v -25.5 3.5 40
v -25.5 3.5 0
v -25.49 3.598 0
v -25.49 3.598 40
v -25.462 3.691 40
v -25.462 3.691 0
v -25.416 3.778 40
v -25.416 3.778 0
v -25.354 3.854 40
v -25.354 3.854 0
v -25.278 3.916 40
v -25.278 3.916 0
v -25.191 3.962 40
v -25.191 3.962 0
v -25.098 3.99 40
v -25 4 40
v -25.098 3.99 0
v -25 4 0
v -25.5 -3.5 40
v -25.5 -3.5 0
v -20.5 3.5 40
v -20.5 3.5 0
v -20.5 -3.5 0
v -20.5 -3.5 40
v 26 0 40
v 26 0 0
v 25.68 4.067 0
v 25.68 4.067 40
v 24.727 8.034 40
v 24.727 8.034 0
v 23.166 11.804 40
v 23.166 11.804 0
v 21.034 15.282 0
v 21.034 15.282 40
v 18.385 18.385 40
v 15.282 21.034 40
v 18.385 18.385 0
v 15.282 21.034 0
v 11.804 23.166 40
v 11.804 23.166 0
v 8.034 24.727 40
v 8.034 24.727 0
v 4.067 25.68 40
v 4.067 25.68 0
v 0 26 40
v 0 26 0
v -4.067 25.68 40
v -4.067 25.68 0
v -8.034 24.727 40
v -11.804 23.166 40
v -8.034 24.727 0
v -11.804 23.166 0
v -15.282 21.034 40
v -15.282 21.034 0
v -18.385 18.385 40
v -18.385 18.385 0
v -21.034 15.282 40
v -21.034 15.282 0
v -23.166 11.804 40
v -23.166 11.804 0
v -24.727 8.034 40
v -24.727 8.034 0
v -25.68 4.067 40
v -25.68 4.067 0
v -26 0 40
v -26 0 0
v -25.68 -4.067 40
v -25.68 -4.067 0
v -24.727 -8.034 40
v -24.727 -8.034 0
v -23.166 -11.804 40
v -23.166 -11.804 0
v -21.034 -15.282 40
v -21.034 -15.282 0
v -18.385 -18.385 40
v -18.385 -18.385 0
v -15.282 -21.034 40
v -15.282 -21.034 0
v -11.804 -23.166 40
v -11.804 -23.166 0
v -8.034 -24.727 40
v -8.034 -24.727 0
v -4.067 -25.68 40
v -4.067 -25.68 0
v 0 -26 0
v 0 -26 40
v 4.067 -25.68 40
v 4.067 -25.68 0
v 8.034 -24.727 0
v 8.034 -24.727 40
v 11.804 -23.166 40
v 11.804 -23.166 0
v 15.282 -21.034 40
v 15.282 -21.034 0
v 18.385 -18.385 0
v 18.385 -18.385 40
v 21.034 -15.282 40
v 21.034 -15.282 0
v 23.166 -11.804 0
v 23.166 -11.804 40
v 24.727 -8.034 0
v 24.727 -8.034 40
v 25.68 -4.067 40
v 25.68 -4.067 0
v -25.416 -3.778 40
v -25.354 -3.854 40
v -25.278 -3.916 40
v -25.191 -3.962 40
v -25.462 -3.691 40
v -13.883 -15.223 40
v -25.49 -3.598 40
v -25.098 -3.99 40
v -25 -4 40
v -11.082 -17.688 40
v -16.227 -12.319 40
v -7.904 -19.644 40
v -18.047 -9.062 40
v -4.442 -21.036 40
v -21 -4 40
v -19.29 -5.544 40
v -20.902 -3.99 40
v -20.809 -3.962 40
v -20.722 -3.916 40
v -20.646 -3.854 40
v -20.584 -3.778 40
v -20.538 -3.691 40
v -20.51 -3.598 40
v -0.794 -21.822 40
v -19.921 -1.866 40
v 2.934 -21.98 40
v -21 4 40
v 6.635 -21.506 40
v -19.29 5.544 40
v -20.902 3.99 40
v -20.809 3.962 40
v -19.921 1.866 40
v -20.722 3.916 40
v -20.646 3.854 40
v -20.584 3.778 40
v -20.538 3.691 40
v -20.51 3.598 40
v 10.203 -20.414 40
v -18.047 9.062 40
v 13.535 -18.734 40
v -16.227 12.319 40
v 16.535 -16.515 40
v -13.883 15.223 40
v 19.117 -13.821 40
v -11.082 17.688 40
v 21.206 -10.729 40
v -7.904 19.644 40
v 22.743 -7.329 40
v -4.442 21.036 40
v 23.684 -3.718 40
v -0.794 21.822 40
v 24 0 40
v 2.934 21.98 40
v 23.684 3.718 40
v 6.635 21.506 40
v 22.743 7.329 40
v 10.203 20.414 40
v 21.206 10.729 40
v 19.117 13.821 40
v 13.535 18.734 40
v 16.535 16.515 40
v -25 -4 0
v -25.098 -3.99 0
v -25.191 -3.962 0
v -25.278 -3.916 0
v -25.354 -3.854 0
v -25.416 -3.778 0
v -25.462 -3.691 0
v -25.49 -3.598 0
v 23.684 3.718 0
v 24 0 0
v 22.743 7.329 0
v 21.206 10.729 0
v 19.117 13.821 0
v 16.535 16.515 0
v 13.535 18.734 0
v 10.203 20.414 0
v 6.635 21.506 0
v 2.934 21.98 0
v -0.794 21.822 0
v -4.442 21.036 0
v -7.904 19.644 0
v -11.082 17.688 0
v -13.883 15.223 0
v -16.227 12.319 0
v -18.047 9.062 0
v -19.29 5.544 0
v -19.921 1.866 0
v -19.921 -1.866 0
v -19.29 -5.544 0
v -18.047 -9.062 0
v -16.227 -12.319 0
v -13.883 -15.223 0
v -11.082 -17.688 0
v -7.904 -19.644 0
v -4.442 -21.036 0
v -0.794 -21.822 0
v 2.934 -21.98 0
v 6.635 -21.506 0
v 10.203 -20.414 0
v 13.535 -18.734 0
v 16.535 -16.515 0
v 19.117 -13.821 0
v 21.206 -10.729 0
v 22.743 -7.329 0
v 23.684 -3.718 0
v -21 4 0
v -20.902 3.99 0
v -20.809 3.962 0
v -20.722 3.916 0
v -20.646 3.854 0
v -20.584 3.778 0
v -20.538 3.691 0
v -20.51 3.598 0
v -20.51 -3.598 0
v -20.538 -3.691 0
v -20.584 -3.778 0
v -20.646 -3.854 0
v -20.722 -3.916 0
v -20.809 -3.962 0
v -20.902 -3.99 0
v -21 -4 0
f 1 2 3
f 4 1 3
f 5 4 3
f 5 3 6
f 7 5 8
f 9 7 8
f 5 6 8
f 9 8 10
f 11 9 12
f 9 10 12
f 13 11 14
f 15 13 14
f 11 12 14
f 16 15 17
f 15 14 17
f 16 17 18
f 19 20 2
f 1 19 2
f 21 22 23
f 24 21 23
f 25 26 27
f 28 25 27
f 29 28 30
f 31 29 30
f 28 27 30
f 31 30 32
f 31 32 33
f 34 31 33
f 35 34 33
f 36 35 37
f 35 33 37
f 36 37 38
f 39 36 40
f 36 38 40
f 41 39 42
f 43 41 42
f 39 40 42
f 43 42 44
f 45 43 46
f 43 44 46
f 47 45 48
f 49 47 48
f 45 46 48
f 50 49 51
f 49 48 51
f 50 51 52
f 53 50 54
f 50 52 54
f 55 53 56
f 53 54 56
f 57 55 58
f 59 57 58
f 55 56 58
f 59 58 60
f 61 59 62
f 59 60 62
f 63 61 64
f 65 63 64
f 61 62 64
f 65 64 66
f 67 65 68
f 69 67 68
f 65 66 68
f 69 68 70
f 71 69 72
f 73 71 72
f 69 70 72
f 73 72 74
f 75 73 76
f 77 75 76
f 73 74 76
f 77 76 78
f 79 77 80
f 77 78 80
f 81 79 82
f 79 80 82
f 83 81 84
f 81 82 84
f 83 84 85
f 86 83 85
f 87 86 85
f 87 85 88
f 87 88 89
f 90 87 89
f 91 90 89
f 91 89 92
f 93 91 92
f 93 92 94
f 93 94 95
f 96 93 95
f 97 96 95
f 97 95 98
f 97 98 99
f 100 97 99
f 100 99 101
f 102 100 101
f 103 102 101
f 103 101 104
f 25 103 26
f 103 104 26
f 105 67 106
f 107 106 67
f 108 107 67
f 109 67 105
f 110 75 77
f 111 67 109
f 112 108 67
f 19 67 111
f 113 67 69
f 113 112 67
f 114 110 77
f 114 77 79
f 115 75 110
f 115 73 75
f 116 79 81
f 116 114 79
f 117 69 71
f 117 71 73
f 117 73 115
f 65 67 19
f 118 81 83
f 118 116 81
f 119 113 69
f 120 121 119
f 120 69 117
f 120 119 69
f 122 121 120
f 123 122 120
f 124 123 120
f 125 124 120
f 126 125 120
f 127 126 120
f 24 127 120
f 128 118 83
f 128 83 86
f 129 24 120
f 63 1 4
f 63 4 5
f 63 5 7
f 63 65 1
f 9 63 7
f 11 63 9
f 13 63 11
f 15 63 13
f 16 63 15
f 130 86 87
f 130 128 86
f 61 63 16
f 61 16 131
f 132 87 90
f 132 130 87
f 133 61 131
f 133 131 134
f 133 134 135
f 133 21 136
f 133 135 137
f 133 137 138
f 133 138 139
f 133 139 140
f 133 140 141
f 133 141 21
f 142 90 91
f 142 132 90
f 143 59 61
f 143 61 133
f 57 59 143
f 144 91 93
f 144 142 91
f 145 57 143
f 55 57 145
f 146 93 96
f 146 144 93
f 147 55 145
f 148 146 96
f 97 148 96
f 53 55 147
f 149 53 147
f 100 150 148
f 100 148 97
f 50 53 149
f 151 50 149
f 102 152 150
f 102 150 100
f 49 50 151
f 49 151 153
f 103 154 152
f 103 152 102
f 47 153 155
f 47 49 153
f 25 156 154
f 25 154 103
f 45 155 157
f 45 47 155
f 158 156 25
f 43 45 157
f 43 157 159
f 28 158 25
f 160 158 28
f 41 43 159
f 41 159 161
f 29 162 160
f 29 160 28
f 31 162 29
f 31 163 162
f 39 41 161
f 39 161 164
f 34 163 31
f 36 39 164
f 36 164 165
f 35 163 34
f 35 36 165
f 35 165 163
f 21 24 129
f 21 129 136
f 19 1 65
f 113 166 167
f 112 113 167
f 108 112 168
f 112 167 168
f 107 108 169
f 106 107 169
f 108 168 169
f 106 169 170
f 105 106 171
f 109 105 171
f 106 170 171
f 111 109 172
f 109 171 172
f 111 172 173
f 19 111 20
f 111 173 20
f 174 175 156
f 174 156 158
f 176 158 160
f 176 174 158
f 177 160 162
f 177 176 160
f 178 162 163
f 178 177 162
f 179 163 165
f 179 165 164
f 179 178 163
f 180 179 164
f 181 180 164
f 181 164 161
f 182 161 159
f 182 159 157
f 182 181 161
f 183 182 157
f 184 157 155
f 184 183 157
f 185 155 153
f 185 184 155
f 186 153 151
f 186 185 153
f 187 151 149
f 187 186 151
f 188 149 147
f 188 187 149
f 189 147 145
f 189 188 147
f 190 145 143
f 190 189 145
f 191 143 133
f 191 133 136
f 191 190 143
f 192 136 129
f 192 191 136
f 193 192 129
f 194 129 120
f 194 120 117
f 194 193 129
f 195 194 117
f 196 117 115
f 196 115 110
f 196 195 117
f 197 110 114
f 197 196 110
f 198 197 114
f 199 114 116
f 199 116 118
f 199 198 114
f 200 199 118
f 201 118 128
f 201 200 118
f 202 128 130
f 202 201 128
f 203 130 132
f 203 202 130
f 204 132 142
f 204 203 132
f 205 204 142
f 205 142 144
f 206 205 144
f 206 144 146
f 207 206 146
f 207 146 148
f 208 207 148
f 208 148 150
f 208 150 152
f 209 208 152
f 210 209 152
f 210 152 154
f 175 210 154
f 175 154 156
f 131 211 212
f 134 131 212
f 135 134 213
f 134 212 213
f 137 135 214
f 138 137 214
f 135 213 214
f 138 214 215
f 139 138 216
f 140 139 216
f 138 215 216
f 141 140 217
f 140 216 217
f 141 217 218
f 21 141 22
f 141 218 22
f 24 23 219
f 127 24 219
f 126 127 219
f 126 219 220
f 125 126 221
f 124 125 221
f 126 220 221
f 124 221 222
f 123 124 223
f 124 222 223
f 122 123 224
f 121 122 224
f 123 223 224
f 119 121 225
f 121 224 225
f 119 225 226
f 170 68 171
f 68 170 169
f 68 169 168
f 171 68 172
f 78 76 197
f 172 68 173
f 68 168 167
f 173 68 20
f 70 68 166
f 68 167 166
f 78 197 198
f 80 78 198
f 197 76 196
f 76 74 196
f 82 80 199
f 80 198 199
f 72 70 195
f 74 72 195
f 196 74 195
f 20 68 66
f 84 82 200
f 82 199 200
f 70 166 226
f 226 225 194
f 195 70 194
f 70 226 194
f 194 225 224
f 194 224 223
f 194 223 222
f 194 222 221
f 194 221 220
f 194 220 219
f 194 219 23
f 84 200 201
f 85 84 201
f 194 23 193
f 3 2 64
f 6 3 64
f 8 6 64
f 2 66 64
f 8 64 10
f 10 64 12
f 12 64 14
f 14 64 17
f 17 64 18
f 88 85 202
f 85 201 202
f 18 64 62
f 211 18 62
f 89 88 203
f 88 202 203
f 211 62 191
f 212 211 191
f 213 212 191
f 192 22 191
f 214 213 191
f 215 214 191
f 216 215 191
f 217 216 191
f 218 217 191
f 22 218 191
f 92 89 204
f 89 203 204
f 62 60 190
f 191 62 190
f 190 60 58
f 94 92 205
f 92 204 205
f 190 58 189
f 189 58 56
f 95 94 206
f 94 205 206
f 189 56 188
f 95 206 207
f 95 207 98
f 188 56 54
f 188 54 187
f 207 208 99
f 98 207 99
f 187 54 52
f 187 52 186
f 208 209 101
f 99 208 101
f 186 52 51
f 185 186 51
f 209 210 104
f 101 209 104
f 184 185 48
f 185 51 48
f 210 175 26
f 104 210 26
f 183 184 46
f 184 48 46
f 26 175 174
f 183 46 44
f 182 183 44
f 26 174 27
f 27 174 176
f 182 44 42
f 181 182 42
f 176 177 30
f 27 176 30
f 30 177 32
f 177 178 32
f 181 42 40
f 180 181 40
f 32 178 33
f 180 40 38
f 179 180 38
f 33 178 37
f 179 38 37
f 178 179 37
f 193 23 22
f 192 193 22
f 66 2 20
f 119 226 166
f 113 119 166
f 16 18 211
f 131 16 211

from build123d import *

# Parameters (mm, degrees)
F0_R     = 26
F0_R_2   = 22
F1_DEPTH = 40


with BuildPart() as f1:
    # F0 (on Top) → F1 (new body)
    with BuildSketch(Plane.XY):
        Circle(F0_R)
        with BuildLine():
            ThreePointArc((-20.5, -3.5), (-20.646447, -3.853553), (-21, -4))
            Line((-21, -4), (-25, -4))
            ThreePointArc((-25, -4), (-25.353553, -3.853553), (-25.5, -3.5))
            Line((-25.5, -3.5), (-25.5, 3.5))
            ThreePointArc((-25.5, 3.5), (-25.353553, 3.853553), (-25, 4))
            Line((-25, 4), (-21, 4))
            ThreePointArc((-21, 4), (-20.646447, 3.853553), (-20.5, 3.5))
            Line((-20.5, 3.5), (-20.5, -3.5))
        make_face(mode=Mode.SUBTRACT)
        with Locations((2, 0)):
            Circle(F0_R_2, mode=Mode.SUBTRACT)
    extrude(amount=F1_DEPTH)


solid = f1.part
